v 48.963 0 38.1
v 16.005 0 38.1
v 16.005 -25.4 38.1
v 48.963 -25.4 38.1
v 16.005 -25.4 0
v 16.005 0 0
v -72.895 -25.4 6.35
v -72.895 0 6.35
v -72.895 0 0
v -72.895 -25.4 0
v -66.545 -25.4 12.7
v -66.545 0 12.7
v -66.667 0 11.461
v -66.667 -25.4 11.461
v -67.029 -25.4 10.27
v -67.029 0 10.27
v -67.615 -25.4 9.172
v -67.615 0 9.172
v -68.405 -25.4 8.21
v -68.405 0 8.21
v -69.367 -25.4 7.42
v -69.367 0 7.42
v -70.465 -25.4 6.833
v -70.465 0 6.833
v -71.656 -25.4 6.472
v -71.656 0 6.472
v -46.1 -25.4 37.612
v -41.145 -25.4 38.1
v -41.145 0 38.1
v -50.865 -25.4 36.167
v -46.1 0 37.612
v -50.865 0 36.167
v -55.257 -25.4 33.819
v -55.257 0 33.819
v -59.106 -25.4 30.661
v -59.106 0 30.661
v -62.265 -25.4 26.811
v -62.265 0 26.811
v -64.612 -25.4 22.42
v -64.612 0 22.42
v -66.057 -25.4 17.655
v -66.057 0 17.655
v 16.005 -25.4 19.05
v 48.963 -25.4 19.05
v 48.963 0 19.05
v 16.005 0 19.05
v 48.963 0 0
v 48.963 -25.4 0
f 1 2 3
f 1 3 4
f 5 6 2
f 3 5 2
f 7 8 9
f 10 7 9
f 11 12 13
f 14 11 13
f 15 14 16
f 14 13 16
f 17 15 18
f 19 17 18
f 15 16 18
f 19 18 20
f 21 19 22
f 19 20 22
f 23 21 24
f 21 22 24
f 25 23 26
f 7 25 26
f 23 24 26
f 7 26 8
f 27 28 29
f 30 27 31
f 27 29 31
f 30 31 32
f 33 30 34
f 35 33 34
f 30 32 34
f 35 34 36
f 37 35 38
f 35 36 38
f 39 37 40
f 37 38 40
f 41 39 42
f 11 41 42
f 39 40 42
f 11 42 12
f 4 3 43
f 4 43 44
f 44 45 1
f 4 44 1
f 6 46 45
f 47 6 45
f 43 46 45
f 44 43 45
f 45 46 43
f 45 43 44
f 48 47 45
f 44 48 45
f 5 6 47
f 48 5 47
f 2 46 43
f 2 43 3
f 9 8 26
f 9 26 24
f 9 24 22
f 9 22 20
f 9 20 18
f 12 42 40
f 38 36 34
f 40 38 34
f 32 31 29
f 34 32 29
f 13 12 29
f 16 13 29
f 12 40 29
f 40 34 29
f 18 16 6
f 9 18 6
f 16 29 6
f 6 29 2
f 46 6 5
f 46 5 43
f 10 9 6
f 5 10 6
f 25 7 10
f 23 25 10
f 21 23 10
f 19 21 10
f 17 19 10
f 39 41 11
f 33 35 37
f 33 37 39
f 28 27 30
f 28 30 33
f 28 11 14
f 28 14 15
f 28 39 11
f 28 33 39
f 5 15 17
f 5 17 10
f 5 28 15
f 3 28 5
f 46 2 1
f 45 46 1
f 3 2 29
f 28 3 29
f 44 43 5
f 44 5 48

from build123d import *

# Parameters (mm, degrees)
F1_DEPTH = 25.4
F0_W     = 32.958177
F0_H     = 19.05
F2_DEPTH = 25.4
F3_DEPTH = 25.4


with BuildPart() as f1:
    # F0 (on Front) → F1 (new body)
    with BuildSketch(Plane.XZ):
        with BuildLine():
            Line((-72.895174, 0), (0, 0))
            Line((0, 0), (3.363179, 0))
            Line((3.363179, 0), (16.004826, 0))
            Line((16.004826, 0), (16.004826, 19.05))
            Line((16.004826, 19.05), (16.004826, 38.1))
            Line((16.004826, 38.1), (-41.145174, 38.1))
            ThreePointArc((-41.145174, 38.1), (-59.105686, 30.660512), (-66.545174, 12.7))
            ThreePointArc((-66.545174, 12.7), (-68.405045, 8.209872), (-72.895174, 6.35))
            Line((-72.895174, 6.35), (-72.895174, 0))
        make_face()
    extrude(amount=F1_DEPTH)


with BuildPart() as f2:
    # F0 (on Front) → F2 (new body)
    with BuildSketch(Plane.XZ):
        with Locations((32.483914, 28.575)):
            Rectangle(F0_W, F0_H)
    extrude(amount=F2_DEPTH)


with BuildPart() as f3:
    # F0 (on Front) → F3 (new body)
    with BuildSketch(Plane.XZ):
        with Locations((32.483914, 9.525)):
            Rectangle(F0_W, F0_H)
    extrude(amount=F3_DEPTH)


solid = Compound([f1.part, f2.part, f3.part])
